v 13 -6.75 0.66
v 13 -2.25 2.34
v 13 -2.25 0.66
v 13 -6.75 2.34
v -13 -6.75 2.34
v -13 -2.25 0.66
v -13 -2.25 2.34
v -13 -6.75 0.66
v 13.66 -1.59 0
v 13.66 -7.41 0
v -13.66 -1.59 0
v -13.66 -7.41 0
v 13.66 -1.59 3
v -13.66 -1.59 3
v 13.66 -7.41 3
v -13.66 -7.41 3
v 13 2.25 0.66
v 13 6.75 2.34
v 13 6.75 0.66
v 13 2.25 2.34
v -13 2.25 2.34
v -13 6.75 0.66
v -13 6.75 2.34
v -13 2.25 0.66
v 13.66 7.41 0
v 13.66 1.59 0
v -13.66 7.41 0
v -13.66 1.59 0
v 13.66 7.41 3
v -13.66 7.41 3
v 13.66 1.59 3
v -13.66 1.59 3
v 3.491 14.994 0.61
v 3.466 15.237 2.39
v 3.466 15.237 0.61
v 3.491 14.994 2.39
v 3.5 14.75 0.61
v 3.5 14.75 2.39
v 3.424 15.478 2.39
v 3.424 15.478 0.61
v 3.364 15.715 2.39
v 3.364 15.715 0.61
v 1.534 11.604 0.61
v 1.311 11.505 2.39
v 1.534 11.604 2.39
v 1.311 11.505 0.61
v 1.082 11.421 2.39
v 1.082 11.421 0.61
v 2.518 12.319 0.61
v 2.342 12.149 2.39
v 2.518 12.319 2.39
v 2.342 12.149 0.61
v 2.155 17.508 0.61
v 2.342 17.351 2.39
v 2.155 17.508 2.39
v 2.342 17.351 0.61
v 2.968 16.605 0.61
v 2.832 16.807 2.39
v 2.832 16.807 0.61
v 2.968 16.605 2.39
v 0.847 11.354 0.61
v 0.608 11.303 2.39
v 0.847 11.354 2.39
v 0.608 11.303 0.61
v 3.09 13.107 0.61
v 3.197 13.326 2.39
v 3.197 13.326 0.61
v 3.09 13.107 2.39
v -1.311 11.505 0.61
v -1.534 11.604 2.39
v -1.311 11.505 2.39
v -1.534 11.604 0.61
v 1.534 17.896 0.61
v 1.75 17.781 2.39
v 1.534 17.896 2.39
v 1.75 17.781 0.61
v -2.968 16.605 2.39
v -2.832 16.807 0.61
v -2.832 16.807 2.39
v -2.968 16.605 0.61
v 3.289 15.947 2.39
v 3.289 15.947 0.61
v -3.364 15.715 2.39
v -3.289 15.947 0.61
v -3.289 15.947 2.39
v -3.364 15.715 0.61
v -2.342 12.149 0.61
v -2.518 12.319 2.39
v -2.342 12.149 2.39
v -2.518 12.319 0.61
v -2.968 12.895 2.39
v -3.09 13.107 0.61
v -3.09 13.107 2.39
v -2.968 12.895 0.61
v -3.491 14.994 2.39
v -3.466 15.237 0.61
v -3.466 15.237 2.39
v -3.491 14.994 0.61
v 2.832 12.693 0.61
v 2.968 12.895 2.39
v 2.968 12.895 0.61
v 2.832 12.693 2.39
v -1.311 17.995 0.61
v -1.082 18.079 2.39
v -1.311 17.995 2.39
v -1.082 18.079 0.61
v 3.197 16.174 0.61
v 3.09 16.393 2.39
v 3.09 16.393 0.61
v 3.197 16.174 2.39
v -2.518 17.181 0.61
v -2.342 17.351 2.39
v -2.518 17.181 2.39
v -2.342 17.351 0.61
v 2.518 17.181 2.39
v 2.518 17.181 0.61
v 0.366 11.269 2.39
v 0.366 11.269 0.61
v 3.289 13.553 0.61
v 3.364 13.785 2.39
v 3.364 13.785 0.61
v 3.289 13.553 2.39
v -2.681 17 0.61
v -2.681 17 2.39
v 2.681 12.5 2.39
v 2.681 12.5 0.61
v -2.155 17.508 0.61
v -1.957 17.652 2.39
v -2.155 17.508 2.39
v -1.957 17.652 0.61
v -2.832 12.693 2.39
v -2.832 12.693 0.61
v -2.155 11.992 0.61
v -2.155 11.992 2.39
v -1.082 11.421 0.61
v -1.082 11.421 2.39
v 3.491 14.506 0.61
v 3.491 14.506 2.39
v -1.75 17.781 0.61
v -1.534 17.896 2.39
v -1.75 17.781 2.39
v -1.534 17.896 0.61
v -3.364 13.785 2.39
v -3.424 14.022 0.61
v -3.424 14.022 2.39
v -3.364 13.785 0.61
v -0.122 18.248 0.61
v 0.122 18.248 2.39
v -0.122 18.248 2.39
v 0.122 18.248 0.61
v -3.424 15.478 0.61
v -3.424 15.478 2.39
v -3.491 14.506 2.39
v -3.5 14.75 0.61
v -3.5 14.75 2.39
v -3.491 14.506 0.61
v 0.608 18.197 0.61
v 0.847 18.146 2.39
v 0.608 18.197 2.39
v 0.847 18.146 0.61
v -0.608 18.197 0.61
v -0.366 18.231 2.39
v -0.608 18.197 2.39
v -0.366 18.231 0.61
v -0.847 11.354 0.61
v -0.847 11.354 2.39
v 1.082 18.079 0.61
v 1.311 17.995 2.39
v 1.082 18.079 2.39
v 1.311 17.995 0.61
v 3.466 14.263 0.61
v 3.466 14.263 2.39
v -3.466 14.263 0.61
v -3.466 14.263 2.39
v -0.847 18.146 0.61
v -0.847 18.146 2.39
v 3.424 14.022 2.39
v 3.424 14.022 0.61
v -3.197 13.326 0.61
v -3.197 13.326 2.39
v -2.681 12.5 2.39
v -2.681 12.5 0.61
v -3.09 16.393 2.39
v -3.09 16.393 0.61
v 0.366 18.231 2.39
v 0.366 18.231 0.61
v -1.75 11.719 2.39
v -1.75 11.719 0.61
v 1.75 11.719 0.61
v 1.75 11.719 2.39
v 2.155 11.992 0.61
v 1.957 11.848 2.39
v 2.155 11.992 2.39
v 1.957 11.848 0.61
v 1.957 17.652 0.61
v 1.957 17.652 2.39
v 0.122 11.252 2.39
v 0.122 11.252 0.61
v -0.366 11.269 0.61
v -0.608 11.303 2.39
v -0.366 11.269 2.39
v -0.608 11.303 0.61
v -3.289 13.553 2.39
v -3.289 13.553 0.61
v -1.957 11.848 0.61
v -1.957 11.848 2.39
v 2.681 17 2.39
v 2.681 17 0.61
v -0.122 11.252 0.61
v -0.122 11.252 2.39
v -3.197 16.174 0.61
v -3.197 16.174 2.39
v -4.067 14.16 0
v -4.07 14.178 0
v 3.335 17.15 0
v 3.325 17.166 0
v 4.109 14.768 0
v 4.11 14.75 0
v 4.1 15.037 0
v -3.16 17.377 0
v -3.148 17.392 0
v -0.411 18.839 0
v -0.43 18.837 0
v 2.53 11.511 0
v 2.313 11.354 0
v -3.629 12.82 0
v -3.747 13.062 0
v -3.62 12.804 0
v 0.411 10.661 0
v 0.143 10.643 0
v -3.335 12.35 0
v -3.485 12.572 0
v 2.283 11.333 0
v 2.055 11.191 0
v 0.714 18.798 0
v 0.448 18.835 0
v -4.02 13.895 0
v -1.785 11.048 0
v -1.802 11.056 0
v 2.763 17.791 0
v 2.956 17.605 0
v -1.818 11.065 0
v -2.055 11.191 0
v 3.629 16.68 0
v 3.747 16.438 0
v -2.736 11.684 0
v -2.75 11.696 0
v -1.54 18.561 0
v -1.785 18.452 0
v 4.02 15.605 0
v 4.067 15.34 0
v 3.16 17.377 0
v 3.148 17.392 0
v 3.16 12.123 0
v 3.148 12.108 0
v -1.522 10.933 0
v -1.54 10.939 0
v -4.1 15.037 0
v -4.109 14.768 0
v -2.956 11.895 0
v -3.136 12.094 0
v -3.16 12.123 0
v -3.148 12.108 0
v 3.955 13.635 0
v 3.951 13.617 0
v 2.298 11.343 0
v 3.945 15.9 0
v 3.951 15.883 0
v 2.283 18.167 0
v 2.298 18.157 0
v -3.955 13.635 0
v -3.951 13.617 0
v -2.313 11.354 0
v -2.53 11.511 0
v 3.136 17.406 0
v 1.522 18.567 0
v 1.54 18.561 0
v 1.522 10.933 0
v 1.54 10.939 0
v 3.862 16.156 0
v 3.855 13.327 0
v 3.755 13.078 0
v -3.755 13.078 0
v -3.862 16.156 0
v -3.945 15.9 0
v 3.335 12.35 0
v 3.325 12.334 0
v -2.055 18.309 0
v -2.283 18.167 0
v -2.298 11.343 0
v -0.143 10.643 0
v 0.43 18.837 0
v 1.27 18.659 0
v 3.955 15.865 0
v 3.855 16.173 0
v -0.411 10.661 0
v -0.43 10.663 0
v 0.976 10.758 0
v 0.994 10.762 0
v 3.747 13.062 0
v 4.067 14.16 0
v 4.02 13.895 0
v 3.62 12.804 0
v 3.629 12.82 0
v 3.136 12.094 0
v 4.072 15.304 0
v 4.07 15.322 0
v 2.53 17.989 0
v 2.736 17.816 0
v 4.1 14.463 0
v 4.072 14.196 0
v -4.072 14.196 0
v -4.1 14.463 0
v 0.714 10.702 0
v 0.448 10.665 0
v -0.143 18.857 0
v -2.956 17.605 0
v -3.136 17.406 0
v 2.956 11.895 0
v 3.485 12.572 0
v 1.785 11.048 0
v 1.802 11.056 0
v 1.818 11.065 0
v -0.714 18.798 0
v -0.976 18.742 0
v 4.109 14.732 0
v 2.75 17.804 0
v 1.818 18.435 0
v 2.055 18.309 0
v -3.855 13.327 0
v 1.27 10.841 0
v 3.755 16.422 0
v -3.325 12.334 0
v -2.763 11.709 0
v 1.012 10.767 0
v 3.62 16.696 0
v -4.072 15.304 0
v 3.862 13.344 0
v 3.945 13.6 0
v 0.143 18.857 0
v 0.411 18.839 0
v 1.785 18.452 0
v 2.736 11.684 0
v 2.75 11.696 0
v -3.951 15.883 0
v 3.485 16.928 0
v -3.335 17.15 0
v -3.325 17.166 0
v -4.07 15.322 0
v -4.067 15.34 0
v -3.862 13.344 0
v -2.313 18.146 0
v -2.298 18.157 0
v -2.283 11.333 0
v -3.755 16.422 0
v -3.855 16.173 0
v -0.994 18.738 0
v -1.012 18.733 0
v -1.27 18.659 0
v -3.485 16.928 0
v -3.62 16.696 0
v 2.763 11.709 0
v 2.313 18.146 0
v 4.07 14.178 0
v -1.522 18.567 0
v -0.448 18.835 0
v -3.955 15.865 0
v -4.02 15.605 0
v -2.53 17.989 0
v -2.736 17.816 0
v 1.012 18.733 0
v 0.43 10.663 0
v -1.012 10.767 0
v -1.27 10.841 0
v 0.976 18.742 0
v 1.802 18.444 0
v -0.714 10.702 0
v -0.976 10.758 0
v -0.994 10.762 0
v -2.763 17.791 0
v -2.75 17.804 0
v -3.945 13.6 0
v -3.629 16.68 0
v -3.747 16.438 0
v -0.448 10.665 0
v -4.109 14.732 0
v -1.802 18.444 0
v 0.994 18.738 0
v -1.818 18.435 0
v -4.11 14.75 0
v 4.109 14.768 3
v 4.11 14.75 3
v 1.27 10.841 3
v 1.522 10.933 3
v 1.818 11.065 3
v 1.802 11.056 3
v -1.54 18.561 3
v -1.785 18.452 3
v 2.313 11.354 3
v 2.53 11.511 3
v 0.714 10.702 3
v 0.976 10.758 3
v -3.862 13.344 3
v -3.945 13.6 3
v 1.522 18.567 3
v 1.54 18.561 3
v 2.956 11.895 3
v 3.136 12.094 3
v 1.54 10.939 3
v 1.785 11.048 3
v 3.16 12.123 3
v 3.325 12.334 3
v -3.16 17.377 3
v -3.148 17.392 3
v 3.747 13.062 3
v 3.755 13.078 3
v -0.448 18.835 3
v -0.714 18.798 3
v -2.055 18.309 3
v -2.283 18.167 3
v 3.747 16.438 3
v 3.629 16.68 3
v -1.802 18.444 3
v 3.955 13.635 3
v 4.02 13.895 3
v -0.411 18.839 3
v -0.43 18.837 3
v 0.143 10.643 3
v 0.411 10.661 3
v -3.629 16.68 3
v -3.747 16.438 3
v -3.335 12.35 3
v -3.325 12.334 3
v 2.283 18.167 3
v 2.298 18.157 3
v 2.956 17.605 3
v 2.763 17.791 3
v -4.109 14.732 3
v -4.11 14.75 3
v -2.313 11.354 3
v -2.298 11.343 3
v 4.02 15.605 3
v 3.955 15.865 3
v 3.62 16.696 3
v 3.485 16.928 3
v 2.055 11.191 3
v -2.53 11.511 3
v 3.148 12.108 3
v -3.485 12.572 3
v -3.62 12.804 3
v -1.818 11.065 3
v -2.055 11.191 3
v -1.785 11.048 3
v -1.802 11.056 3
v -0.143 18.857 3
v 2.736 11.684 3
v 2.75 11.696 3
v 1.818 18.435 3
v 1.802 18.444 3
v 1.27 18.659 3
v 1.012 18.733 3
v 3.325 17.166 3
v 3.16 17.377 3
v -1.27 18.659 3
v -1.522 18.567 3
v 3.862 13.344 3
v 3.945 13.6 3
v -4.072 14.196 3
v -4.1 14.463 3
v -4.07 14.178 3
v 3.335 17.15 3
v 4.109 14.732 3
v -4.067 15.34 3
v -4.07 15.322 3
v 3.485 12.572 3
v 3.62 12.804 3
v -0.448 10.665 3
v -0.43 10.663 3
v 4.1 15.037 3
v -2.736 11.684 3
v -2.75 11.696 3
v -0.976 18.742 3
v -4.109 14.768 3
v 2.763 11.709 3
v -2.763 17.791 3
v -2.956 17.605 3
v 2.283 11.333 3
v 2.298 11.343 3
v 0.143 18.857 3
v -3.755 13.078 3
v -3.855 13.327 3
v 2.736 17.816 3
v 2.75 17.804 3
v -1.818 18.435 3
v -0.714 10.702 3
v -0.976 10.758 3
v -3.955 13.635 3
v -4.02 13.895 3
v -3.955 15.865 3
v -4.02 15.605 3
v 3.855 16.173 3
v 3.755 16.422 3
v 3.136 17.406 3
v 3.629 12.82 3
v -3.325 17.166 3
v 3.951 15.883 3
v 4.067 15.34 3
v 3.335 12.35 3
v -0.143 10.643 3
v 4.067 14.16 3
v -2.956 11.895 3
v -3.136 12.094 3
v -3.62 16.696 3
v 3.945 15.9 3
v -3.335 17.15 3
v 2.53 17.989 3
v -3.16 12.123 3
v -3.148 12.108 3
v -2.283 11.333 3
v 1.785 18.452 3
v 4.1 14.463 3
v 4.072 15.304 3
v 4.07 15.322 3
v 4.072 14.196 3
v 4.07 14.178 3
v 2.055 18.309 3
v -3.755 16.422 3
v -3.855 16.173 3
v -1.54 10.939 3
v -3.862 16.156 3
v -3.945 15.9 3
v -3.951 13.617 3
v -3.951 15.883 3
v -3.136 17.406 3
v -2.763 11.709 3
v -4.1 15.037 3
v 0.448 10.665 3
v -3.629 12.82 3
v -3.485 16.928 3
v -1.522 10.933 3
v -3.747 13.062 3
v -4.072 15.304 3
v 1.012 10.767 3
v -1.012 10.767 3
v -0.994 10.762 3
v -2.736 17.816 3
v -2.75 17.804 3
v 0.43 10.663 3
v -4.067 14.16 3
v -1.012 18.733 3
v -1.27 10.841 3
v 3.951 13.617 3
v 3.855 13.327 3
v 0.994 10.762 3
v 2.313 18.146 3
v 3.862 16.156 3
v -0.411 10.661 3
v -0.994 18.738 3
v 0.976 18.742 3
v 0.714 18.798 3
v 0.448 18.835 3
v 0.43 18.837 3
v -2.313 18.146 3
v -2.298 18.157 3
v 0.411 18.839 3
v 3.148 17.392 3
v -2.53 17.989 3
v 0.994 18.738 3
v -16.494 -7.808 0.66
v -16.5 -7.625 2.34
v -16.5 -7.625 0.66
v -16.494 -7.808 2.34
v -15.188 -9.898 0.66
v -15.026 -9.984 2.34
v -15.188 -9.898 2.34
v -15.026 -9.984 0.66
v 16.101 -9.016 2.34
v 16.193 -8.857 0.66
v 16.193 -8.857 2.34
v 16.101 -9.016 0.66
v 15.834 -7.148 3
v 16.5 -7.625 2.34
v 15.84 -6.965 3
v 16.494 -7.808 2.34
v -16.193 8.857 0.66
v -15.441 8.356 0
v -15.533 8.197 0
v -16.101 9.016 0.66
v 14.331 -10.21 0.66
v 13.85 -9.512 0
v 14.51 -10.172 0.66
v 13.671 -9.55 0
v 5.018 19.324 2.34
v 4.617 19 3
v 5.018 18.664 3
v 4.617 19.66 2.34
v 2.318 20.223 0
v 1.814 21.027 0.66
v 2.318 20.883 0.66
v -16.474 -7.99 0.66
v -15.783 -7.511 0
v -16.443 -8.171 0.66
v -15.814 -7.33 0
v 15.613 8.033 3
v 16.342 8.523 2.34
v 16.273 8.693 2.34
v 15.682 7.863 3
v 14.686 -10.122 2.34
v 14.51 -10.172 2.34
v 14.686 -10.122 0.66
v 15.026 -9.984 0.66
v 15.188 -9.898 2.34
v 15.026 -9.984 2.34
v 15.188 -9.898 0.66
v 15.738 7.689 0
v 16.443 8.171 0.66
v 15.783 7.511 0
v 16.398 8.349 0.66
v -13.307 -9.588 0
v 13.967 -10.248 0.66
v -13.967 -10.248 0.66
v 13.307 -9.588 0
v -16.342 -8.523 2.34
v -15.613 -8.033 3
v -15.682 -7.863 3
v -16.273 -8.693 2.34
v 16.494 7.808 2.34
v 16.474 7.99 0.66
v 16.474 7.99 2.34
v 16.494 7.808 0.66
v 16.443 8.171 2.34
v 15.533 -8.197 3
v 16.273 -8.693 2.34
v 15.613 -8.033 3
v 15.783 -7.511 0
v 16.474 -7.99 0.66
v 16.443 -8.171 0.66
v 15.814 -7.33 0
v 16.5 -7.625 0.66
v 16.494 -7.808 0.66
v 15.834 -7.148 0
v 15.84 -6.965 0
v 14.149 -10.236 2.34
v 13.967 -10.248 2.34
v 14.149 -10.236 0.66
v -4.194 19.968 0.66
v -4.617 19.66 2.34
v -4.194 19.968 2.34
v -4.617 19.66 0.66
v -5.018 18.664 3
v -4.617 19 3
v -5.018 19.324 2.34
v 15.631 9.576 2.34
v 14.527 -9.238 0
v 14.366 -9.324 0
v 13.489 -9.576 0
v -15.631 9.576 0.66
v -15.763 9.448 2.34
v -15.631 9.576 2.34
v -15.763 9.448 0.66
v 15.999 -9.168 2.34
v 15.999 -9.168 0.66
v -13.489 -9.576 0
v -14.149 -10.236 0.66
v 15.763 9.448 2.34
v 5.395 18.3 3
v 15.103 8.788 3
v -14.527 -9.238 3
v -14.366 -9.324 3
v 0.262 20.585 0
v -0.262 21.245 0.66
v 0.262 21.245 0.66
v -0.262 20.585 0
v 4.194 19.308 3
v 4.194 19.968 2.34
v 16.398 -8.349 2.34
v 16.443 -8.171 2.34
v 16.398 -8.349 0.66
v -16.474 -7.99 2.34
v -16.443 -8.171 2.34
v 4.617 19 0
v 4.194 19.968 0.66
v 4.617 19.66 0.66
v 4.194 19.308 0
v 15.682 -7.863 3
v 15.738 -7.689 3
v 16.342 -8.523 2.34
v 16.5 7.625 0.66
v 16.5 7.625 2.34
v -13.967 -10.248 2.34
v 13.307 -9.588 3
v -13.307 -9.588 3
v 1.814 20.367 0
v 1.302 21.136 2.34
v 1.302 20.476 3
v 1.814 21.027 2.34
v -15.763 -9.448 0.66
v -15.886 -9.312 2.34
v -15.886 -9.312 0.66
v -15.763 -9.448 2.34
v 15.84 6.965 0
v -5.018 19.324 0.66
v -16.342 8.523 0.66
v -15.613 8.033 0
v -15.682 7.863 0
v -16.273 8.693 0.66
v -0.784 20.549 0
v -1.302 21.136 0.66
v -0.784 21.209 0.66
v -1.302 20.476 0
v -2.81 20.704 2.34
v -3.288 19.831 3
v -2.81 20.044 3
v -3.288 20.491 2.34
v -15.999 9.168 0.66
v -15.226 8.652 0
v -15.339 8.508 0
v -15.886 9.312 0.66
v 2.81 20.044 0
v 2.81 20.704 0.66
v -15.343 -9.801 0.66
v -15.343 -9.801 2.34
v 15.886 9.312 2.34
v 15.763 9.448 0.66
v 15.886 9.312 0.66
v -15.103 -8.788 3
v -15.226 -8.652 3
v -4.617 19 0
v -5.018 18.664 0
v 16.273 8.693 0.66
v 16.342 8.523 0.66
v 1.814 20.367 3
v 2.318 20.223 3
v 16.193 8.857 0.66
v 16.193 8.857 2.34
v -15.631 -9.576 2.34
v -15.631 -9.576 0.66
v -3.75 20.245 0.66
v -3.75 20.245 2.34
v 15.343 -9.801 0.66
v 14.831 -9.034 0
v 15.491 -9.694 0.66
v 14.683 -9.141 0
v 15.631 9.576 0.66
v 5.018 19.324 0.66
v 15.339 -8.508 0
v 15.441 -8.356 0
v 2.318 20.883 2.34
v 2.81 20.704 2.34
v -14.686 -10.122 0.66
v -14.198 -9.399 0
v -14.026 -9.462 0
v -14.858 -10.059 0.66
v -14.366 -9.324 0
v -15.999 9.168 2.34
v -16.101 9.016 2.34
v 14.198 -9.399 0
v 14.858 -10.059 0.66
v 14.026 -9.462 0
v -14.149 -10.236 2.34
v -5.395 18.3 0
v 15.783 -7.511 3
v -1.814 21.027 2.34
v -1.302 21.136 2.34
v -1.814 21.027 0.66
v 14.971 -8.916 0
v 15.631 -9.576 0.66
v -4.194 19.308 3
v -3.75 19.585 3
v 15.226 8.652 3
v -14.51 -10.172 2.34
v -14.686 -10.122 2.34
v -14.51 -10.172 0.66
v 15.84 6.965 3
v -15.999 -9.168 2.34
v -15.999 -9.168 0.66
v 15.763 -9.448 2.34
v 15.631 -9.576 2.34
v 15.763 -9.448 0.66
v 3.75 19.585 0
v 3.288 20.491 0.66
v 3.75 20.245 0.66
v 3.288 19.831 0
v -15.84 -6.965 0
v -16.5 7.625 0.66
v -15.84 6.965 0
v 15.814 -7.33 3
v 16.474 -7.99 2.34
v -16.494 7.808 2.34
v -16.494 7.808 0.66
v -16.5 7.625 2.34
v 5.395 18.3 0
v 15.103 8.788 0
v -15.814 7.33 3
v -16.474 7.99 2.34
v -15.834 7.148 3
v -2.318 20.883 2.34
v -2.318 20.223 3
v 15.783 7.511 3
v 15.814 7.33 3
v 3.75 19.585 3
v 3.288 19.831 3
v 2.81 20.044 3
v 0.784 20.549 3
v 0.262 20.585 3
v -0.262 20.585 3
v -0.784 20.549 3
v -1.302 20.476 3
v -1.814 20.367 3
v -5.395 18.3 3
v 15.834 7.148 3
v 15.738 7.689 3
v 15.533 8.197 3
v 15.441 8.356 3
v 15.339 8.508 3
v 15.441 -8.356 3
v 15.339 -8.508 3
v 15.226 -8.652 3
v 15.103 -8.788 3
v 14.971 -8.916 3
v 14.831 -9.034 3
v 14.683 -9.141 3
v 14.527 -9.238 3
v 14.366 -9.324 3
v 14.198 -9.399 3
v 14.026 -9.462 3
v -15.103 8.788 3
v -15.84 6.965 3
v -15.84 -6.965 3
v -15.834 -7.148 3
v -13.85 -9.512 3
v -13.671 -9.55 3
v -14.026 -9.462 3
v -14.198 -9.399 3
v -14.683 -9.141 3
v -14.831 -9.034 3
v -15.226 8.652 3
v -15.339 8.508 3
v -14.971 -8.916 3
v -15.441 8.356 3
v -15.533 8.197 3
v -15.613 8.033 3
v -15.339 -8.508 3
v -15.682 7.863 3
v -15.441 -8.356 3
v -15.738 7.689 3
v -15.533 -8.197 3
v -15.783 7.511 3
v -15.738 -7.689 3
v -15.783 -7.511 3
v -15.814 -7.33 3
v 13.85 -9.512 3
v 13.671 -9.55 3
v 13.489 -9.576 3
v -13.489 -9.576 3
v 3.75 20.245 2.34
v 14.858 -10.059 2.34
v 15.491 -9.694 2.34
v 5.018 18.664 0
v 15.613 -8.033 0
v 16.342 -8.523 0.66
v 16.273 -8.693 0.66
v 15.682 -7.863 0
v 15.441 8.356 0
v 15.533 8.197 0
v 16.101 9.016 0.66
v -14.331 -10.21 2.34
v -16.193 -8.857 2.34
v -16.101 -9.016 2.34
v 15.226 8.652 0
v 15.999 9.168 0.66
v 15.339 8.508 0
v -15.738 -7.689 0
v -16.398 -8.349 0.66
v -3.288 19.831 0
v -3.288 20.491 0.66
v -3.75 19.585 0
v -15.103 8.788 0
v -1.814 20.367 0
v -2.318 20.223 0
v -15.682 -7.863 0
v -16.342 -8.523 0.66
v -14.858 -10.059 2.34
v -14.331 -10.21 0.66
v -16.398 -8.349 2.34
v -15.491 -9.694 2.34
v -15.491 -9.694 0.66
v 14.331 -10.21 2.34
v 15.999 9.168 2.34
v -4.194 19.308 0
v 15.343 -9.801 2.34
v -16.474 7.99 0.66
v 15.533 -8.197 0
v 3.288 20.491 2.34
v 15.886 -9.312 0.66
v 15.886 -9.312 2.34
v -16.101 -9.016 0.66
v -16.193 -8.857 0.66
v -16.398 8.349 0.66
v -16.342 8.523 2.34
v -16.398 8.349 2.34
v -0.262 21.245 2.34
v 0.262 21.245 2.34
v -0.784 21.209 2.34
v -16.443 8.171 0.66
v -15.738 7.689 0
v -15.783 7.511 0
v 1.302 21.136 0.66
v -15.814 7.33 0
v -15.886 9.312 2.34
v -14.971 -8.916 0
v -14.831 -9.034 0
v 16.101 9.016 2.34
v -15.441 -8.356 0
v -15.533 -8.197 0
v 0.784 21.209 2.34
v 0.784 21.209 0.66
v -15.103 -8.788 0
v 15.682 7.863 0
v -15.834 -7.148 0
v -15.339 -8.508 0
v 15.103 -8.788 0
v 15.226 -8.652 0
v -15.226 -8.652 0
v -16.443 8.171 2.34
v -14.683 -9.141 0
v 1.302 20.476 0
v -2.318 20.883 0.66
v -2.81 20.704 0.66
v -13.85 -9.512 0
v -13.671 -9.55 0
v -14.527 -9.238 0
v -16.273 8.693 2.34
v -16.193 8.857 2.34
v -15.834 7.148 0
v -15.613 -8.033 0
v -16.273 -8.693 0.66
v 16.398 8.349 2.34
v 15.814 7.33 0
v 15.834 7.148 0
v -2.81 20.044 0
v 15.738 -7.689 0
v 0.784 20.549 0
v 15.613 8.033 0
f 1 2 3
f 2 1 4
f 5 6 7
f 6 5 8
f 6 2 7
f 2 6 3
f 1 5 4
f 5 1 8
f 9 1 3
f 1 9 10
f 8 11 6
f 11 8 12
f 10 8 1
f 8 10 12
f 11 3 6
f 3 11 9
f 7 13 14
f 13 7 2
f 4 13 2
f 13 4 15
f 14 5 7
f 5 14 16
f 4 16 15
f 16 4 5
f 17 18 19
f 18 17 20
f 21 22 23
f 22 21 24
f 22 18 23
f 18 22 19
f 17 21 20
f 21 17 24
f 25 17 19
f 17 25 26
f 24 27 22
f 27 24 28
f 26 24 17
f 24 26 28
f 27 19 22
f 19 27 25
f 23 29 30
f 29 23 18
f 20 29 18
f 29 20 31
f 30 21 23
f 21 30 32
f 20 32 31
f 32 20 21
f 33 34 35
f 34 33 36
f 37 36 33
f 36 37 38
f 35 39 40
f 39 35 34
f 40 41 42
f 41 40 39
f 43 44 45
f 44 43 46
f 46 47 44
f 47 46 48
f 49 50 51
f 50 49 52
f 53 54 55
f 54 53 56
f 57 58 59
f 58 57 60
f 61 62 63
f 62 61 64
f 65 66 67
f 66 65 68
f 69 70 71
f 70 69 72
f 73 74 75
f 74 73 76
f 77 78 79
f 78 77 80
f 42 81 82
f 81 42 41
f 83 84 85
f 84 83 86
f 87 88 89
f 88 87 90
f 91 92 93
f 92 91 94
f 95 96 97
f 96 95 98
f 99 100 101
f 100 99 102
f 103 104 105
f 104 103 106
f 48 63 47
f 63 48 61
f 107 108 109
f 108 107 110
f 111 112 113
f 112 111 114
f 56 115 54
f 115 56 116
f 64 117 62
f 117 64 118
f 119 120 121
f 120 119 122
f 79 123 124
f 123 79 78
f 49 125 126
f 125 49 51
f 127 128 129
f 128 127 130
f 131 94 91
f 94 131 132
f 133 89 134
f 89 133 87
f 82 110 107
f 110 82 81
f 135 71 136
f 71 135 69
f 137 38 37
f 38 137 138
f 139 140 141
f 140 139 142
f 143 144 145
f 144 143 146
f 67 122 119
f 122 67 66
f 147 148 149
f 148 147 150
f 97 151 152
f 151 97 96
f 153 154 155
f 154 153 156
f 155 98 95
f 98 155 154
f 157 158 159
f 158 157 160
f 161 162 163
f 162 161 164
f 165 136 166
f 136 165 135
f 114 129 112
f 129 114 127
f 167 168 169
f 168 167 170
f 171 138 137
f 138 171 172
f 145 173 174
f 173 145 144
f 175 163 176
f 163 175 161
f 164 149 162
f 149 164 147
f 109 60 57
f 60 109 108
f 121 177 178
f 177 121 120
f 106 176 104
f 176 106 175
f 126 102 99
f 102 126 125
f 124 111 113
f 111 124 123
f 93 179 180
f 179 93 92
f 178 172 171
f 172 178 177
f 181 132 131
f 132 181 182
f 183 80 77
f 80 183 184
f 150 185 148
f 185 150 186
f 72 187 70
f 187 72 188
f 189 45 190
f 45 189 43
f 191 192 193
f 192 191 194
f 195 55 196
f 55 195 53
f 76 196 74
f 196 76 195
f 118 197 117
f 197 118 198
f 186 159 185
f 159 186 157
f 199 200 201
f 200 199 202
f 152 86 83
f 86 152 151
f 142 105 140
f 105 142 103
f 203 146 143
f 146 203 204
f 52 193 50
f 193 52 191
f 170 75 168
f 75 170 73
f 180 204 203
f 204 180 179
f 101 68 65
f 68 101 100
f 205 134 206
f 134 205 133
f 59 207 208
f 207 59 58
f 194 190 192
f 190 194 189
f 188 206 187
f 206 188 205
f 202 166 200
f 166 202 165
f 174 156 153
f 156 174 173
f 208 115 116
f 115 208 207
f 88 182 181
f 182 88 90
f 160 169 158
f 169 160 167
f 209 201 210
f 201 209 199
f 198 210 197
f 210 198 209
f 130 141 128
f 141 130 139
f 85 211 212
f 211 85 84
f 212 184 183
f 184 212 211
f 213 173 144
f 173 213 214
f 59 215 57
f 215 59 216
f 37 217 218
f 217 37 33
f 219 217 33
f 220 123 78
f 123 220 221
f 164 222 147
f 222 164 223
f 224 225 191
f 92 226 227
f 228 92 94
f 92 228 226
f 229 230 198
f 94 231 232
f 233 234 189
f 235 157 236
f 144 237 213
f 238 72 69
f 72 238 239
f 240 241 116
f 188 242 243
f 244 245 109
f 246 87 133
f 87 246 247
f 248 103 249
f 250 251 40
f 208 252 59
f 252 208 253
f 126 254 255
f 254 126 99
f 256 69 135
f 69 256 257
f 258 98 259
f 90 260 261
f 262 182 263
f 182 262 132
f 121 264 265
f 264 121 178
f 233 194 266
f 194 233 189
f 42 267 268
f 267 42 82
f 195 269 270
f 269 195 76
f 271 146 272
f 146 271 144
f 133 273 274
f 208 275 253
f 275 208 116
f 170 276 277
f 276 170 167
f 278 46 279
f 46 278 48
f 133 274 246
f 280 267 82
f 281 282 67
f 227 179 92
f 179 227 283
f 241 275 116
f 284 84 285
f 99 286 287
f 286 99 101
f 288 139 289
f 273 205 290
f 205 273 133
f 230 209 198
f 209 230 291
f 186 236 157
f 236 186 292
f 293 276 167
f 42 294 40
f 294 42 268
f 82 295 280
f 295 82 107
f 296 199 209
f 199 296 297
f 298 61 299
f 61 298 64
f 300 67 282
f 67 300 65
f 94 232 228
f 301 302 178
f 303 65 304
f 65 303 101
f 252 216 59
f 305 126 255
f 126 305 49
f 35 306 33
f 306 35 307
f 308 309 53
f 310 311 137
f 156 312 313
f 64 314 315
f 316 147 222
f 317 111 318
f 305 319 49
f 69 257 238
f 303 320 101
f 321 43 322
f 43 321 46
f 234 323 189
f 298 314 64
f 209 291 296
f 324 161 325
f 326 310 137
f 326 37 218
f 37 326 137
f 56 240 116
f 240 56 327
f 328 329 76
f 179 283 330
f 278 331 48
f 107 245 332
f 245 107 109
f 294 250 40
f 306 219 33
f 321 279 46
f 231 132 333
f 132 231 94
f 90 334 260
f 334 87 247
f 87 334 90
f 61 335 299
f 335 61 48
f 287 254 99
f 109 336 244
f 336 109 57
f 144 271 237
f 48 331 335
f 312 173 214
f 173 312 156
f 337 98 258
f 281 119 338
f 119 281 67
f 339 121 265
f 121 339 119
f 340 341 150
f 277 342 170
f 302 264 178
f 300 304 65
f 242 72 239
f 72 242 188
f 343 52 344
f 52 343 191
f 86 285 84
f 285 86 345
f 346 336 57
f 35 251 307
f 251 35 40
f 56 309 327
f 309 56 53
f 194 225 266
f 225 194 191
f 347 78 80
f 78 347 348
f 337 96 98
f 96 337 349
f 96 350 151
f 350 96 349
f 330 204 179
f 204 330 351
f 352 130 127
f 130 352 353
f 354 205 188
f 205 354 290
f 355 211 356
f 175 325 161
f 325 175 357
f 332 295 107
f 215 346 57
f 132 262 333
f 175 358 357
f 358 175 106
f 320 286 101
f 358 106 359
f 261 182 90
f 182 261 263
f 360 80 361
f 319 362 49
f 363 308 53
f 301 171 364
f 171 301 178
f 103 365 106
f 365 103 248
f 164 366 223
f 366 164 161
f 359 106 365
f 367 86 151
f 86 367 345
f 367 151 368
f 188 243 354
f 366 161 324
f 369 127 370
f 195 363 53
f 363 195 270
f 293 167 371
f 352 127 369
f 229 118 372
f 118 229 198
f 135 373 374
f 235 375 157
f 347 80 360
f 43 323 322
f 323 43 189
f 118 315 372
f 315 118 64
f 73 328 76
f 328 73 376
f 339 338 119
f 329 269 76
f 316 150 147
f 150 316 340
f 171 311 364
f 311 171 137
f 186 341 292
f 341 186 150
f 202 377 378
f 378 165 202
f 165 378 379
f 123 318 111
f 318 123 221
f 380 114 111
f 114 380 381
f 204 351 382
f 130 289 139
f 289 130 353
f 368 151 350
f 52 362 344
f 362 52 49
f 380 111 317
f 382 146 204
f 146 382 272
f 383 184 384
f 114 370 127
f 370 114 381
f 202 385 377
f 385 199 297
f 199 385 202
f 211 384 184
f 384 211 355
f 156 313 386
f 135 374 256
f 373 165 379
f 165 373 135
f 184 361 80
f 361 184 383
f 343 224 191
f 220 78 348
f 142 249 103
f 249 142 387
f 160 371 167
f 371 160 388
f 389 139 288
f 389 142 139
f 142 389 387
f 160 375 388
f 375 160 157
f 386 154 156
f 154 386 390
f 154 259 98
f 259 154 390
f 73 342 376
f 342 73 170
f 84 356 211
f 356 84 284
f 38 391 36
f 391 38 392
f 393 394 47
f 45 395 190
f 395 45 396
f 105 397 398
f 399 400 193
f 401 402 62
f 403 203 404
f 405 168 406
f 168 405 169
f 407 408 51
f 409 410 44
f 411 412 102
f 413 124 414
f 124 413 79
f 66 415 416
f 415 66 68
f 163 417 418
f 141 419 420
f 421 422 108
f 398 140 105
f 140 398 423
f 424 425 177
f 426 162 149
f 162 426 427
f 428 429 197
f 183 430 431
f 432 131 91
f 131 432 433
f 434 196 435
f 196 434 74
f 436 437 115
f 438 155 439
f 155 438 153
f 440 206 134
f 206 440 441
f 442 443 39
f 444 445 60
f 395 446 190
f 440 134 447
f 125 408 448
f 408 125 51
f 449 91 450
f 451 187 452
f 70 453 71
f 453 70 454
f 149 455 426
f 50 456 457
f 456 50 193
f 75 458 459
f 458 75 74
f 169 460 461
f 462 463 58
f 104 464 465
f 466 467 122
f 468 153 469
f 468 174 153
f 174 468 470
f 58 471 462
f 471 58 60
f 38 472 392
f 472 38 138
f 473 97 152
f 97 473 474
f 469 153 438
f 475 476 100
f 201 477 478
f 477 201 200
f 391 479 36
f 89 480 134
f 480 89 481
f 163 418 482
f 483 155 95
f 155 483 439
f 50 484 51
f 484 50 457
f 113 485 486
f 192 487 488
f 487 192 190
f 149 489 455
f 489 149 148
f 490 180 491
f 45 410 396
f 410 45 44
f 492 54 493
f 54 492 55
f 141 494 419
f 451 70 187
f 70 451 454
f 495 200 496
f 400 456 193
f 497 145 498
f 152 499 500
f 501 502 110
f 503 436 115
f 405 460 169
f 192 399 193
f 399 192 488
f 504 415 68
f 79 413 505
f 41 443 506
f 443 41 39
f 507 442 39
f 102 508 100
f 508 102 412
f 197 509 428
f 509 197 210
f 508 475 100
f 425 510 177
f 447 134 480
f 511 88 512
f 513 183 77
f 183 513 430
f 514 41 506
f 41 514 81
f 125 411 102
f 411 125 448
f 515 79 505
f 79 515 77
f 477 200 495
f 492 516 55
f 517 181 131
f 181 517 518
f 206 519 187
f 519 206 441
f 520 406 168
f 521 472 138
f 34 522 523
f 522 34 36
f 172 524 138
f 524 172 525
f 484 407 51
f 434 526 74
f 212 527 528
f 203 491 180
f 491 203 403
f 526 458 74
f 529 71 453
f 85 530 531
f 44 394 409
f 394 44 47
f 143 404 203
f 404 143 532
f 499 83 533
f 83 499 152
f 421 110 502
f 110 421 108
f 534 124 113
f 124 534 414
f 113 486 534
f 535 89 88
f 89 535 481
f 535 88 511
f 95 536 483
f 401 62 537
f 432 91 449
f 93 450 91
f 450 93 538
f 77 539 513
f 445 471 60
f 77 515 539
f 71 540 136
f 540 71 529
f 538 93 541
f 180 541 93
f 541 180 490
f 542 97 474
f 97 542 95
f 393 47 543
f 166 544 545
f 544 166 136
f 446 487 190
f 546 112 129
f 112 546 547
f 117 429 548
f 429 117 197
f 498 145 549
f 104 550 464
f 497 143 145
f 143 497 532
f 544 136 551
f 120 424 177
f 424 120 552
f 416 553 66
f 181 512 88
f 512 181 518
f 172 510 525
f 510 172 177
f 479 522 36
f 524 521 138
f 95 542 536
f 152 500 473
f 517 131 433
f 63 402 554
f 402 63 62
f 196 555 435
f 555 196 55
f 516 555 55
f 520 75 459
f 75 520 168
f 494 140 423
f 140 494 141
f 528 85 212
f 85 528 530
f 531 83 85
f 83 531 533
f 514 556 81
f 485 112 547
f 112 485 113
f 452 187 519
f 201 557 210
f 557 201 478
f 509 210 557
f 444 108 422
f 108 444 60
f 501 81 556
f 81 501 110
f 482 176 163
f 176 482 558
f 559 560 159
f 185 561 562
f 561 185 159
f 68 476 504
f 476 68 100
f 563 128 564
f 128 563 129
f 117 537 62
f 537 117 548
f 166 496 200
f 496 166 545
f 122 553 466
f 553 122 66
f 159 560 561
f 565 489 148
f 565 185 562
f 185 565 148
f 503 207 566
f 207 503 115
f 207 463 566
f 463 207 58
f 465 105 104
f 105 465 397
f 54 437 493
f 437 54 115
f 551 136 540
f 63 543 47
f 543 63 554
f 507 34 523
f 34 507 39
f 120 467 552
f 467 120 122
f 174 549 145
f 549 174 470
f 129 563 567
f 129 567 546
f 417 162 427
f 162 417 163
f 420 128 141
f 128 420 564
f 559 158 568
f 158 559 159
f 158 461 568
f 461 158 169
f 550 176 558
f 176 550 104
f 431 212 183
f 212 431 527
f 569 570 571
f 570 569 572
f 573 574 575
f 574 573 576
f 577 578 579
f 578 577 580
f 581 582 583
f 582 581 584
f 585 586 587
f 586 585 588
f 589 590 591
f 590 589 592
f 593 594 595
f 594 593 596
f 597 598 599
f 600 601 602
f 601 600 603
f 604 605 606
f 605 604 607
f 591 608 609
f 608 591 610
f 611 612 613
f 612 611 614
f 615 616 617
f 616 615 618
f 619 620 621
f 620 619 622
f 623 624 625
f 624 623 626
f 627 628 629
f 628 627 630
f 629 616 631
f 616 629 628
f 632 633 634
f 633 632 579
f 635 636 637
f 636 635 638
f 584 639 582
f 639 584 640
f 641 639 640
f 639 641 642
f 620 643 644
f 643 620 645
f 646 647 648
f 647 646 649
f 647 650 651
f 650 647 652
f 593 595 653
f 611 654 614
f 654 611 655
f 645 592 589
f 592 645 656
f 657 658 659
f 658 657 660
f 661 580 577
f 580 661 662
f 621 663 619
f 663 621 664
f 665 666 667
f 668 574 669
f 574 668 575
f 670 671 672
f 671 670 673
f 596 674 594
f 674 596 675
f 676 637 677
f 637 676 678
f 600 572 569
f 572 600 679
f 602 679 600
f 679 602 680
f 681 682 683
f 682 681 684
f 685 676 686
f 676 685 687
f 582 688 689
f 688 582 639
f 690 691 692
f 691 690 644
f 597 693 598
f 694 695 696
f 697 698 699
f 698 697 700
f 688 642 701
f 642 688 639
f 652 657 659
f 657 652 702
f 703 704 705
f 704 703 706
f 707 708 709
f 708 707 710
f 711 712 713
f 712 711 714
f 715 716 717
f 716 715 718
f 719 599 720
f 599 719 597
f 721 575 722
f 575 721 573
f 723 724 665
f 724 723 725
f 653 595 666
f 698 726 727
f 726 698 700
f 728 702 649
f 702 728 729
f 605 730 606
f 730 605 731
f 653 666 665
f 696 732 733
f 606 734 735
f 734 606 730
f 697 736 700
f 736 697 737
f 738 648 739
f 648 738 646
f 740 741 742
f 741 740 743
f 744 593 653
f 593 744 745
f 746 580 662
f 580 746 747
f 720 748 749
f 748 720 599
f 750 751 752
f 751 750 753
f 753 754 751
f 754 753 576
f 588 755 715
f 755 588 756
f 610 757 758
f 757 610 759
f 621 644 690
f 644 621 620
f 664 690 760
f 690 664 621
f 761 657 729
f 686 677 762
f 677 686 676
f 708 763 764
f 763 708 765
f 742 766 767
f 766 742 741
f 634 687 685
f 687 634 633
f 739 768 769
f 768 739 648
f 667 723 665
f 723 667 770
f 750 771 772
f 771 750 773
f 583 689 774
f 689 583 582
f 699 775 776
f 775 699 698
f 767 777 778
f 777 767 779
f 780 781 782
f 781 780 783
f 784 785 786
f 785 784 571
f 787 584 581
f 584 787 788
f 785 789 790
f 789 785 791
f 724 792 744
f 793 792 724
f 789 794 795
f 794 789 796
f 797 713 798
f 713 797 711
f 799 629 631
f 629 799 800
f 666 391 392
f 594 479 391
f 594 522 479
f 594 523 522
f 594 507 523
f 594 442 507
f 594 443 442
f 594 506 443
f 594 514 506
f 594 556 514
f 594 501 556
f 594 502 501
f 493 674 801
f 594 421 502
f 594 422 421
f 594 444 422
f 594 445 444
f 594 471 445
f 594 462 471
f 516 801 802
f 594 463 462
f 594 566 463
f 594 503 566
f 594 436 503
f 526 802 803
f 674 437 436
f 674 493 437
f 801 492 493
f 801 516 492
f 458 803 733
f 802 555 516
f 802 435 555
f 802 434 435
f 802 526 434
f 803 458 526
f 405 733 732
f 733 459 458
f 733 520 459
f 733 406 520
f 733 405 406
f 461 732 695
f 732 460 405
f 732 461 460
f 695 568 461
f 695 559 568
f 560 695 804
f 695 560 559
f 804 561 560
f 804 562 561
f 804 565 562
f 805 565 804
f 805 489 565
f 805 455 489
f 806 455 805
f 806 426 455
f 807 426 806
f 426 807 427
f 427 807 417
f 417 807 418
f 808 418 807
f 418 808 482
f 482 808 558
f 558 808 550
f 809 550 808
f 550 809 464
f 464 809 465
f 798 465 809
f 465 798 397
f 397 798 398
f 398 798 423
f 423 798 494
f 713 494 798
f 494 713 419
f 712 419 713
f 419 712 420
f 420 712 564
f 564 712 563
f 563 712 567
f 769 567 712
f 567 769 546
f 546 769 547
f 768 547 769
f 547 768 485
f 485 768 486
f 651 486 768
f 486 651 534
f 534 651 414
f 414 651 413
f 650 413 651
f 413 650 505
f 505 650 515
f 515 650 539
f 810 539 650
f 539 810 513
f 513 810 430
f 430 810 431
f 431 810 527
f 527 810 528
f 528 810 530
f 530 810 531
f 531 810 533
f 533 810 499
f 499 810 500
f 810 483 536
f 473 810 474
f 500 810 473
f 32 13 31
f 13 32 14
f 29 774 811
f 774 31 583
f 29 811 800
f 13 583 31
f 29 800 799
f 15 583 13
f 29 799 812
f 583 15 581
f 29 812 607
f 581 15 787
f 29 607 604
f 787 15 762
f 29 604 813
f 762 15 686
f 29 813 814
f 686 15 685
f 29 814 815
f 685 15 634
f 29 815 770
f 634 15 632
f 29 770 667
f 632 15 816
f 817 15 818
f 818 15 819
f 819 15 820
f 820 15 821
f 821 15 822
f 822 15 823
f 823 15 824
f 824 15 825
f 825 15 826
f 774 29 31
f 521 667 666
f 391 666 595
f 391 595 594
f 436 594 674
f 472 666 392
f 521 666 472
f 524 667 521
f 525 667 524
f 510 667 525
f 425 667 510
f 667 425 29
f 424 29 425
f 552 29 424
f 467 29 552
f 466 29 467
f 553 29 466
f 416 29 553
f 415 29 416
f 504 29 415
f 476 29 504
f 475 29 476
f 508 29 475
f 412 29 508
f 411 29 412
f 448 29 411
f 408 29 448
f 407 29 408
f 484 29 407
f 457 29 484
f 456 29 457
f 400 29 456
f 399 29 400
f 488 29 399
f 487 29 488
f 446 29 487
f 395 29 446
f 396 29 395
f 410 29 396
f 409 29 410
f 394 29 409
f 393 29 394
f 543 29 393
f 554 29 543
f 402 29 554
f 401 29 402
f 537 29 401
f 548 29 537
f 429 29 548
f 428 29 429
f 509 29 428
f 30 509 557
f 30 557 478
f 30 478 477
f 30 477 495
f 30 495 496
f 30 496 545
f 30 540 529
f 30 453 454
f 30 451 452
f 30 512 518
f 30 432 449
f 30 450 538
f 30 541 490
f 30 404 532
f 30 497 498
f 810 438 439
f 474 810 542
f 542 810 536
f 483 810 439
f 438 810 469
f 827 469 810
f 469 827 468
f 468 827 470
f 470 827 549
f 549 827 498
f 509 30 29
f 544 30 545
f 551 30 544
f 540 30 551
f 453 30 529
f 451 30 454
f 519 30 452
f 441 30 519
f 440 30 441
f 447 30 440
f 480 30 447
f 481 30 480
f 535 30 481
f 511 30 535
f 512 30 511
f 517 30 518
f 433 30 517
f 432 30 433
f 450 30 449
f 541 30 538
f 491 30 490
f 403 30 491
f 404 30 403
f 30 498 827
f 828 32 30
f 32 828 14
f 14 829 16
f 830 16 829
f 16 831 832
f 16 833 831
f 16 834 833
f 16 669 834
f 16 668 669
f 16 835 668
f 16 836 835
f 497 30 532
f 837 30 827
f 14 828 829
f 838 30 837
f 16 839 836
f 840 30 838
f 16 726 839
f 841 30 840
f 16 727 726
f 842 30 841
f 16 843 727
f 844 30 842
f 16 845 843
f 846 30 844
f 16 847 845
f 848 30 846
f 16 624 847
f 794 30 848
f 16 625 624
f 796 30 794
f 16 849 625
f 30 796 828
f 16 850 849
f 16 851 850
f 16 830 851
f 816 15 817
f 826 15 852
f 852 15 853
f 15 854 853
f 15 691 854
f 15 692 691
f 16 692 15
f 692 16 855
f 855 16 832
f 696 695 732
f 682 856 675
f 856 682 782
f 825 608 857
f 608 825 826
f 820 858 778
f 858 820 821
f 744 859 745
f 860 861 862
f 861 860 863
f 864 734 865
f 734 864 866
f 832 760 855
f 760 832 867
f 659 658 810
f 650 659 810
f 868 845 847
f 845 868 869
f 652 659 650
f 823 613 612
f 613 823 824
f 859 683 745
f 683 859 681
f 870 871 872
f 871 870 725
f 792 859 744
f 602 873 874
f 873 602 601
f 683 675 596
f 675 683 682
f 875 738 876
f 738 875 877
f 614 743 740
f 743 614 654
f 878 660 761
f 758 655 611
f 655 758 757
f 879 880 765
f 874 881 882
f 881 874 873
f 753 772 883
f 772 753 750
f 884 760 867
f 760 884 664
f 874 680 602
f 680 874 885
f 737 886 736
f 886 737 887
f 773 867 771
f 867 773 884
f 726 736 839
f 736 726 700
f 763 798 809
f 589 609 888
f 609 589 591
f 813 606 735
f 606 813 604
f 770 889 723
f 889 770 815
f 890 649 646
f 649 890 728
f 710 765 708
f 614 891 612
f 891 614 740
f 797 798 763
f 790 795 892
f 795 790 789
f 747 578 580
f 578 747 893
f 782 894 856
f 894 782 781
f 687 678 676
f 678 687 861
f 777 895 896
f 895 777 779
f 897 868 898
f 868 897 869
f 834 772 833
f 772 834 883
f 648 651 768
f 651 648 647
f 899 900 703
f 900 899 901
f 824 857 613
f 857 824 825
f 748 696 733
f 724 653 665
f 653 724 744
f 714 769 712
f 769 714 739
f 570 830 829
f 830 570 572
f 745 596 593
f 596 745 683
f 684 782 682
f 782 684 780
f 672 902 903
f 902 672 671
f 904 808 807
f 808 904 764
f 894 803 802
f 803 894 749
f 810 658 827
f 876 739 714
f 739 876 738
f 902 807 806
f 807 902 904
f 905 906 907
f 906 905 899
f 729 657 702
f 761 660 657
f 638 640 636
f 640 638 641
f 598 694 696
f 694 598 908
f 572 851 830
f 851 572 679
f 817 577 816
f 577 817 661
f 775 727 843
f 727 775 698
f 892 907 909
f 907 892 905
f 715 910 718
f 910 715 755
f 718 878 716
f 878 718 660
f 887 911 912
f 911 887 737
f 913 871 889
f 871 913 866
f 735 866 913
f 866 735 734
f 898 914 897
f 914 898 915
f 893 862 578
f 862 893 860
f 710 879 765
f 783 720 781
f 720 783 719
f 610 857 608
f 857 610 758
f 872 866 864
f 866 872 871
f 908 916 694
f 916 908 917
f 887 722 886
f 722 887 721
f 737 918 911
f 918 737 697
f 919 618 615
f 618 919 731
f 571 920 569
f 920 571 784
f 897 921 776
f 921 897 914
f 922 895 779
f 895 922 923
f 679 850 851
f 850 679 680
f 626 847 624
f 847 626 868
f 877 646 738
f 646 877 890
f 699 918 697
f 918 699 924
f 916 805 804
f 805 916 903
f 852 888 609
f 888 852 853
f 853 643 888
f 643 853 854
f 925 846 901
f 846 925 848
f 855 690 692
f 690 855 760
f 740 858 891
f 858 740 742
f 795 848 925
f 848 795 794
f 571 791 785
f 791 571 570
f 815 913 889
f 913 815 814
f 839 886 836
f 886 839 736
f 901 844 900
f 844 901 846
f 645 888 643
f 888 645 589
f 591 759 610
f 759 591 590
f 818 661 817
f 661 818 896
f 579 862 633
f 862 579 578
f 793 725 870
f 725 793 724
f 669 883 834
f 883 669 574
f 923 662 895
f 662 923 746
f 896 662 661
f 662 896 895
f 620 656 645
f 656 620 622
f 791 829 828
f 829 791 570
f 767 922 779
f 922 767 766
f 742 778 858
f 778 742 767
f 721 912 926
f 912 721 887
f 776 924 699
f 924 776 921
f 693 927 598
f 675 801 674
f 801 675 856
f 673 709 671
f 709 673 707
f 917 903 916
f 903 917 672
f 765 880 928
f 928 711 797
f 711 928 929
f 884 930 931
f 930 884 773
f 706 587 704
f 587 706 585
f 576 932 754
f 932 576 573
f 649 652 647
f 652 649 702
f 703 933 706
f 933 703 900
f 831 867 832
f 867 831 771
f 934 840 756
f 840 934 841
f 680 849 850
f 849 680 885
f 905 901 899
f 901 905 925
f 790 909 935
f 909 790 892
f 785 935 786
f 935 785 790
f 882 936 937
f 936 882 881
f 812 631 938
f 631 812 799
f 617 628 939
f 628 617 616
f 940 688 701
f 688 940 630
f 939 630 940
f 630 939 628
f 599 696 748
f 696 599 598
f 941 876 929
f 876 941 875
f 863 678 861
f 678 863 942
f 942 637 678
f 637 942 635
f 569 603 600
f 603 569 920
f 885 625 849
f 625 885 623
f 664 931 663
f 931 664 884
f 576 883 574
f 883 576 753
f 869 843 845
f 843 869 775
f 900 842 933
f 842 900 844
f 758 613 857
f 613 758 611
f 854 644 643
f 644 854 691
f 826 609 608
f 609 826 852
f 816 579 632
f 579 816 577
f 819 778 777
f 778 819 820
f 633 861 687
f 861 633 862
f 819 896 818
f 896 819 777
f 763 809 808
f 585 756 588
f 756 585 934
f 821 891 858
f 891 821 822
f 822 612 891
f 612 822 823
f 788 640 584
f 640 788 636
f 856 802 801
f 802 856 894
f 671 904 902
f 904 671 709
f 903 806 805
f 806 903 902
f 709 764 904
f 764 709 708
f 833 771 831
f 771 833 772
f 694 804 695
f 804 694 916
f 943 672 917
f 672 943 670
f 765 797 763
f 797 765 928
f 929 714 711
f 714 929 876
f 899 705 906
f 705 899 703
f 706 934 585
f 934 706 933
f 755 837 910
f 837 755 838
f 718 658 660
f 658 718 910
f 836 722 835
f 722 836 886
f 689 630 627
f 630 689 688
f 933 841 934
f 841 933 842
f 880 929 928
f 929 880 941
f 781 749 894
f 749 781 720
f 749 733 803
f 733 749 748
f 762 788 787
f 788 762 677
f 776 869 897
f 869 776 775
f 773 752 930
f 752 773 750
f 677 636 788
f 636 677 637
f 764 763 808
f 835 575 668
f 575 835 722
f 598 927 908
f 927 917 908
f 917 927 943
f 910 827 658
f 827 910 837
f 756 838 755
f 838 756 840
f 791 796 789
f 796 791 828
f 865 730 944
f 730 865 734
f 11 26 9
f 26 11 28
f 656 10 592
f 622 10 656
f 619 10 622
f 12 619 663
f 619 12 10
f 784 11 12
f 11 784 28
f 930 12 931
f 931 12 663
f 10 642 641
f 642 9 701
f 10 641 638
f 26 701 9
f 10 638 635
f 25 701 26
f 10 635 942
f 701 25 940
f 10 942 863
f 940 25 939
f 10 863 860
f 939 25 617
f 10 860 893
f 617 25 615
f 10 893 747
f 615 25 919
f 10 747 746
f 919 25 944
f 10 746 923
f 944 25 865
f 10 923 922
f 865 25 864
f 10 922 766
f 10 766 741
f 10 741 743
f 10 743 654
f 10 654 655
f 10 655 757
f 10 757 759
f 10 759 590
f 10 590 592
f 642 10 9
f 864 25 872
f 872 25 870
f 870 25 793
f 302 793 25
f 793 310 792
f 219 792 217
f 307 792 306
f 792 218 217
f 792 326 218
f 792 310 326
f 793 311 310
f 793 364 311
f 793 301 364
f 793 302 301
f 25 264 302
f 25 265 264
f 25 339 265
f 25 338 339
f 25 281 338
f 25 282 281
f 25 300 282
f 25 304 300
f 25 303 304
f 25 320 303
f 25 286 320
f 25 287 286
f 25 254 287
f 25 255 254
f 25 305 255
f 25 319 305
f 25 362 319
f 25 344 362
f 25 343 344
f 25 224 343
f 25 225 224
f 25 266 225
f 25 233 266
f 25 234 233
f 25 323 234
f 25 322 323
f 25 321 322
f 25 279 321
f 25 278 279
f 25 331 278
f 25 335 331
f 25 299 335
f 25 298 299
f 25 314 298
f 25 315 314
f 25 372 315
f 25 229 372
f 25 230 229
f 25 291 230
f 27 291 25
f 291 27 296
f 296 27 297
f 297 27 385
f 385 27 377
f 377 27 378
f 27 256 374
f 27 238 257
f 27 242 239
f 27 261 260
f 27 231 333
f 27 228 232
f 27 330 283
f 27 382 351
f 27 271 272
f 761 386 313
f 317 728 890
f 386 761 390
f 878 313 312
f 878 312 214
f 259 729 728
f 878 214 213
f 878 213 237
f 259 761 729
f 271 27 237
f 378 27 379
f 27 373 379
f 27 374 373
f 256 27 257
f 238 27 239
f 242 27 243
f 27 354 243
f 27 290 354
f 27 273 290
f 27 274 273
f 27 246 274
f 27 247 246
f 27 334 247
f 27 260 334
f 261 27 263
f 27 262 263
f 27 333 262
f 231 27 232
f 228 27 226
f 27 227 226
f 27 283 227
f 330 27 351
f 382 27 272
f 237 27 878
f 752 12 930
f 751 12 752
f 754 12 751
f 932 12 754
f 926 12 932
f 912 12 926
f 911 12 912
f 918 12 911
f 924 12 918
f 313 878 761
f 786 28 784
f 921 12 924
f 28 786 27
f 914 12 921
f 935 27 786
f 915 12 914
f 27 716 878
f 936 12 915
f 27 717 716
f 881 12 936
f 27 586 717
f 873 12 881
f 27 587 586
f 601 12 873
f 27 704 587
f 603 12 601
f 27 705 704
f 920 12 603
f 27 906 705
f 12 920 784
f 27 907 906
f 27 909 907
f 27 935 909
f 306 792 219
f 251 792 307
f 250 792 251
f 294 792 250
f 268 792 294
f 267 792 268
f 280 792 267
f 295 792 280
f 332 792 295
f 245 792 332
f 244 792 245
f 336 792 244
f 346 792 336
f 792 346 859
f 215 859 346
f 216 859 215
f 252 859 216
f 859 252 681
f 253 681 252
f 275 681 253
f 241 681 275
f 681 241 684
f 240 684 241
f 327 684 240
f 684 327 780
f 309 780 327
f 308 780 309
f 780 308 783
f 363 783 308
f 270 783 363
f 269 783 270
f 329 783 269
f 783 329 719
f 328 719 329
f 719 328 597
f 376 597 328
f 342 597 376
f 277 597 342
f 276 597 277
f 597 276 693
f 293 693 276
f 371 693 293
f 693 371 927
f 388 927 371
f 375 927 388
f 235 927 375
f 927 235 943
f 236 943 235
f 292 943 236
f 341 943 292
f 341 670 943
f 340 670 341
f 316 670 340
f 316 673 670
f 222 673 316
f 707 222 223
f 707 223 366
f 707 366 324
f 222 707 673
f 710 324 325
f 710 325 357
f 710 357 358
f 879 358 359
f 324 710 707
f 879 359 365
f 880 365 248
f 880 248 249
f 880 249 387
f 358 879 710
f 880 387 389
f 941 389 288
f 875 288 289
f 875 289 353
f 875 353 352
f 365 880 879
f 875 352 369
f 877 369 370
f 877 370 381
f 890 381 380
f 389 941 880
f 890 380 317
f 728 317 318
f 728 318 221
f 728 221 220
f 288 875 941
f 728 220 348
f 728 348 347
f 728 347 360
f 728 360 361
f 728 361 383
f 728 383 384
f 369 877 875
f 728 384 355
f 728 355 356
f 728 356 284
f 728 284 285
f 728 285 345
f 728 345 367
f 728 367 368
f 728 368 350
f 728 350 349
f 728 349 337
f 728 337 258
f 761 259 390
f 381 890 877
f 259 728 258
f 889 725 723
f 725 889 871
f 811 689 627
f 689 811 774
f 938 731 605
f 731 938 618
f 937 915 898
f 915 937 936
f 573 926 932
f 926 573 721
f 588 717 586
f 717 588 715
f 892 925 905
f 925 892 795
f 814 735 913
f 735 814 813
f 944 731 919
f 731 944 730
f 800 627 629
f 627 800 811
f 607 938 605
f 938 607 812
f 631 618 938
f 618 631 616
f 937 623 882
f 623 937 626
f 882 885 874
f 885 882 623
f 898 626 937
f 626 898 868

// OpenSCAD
//=== Flat Tri Glide ===//

//width of the webbing opening (1in = 25.4 mm)
_1_webbingWidth = 26;

// width of the gap for the webbing
_2_webbingGap = 4.5;

// thickness of the edge
_3_edgeThickness = 3.5;

// thickness of the center beam
_4_centerThickness = 4.5;

// height of the tri glide
_5_height = 3;

// percent corner rounding
_6_cornerRounding = 75; // [1:100]

// ho much to break off the edges
_7_cornerBreakage = 0.66;

// diameter of eyelet
_8_eyeDiameter = 7;

// thicknes of the eyelets rim
_9_eyeRimThickness = 4;




module makeBody(xsize, ysize, height, radius,edgeThickness,eyeRad,eyeRim) {
	translate([0,0,height/2]) {
		minkowski() {
			cube(size=[xsize-2*radius,ysize-2*radius, height/2], center = true);
			cylinder(r=radius, h=height/2, center=true);
		}
	}
	translate([0,ysize/2+eyeRad,0]) 
		cylinder(r=eyeRad+eyeRim,h=height);
}

module makeCuts(width, gap, thickness, height,b,eyeRad,eyeRim) {
    eps=0.05;
	offset = (thickness+gap)/2;
	for (y = [-offset, offset]) {
		translate([0, y, 0]) {

			translate([0, 0, height/2])
				cube(size=[width, gap, height*2], center=true);
			translate([0, 0, 0])
				makeCutEnd(width, gap, thickness, height,b);
			translate([0, 0, height]) scale([1,1,-1])
				makeCutEnd(width, gap, thickness, height,b);
		}
	translate([0,2*offset+gap/2 +eyeRad,-height*0.1]) 
		cylinder(r=eyeRad,h=height*1.2);
	translate([0,2*offset+gap/2 +eyeRad,-eps]) 
		cylinder(r1=eyeRad+b,r2=eyeRad,h=b);
	translate([0,2*offset+gap/2 +eyeRad,height-b+eps]) 
		cylinder(r1=eyeRad,r2=eyeRad+b,h=b);
	}
}

module makeCutEnd(width, gap, thickness, height,b)
{
	hull(){
		translate([0,0,+b/2])
			cube(size=[width, gap, b], center=true);
		translate([0,0,-b/2])
			cube(size=[width+2*b, gap+2*b, b], center=true);			
	}
}

module makeTriGlide(width, gap, edgeThickness, centerThickness, height, rounding, 
                    b, eyeDiam, eyeRim ,$fn=90) {
	xsize = width + edgeThickness * 2;
	ysize = centerThickness + edgeThickness * 2 + gap * 2;
	radius = edgeThickness*(rounding/100);
	difference() {
        hull()
        {
		  makeBody(xsize-2*b, ysize-2*b, height, radius,edgeThickness,eyeDiam/2,eyeRim);
          translate([0,0,b])
		  makeBody(xsize, ysize, height-2*b, radius,edgeThickness,eyeDiam/2,eyeRim);
        }
		makeCuts(width, gap, centerThickness, height,b,eyeDiam/2,eyeRim);
	}
}


makeTriGlide(_1_webbingWidth, _2_webbingGap, _3_edgeThickness, _4_centerThickness, _5_height, _6_cornerRounding,_7_cornerBreakage,_8_eyeDiameter,_9_eyeRimThickness);
